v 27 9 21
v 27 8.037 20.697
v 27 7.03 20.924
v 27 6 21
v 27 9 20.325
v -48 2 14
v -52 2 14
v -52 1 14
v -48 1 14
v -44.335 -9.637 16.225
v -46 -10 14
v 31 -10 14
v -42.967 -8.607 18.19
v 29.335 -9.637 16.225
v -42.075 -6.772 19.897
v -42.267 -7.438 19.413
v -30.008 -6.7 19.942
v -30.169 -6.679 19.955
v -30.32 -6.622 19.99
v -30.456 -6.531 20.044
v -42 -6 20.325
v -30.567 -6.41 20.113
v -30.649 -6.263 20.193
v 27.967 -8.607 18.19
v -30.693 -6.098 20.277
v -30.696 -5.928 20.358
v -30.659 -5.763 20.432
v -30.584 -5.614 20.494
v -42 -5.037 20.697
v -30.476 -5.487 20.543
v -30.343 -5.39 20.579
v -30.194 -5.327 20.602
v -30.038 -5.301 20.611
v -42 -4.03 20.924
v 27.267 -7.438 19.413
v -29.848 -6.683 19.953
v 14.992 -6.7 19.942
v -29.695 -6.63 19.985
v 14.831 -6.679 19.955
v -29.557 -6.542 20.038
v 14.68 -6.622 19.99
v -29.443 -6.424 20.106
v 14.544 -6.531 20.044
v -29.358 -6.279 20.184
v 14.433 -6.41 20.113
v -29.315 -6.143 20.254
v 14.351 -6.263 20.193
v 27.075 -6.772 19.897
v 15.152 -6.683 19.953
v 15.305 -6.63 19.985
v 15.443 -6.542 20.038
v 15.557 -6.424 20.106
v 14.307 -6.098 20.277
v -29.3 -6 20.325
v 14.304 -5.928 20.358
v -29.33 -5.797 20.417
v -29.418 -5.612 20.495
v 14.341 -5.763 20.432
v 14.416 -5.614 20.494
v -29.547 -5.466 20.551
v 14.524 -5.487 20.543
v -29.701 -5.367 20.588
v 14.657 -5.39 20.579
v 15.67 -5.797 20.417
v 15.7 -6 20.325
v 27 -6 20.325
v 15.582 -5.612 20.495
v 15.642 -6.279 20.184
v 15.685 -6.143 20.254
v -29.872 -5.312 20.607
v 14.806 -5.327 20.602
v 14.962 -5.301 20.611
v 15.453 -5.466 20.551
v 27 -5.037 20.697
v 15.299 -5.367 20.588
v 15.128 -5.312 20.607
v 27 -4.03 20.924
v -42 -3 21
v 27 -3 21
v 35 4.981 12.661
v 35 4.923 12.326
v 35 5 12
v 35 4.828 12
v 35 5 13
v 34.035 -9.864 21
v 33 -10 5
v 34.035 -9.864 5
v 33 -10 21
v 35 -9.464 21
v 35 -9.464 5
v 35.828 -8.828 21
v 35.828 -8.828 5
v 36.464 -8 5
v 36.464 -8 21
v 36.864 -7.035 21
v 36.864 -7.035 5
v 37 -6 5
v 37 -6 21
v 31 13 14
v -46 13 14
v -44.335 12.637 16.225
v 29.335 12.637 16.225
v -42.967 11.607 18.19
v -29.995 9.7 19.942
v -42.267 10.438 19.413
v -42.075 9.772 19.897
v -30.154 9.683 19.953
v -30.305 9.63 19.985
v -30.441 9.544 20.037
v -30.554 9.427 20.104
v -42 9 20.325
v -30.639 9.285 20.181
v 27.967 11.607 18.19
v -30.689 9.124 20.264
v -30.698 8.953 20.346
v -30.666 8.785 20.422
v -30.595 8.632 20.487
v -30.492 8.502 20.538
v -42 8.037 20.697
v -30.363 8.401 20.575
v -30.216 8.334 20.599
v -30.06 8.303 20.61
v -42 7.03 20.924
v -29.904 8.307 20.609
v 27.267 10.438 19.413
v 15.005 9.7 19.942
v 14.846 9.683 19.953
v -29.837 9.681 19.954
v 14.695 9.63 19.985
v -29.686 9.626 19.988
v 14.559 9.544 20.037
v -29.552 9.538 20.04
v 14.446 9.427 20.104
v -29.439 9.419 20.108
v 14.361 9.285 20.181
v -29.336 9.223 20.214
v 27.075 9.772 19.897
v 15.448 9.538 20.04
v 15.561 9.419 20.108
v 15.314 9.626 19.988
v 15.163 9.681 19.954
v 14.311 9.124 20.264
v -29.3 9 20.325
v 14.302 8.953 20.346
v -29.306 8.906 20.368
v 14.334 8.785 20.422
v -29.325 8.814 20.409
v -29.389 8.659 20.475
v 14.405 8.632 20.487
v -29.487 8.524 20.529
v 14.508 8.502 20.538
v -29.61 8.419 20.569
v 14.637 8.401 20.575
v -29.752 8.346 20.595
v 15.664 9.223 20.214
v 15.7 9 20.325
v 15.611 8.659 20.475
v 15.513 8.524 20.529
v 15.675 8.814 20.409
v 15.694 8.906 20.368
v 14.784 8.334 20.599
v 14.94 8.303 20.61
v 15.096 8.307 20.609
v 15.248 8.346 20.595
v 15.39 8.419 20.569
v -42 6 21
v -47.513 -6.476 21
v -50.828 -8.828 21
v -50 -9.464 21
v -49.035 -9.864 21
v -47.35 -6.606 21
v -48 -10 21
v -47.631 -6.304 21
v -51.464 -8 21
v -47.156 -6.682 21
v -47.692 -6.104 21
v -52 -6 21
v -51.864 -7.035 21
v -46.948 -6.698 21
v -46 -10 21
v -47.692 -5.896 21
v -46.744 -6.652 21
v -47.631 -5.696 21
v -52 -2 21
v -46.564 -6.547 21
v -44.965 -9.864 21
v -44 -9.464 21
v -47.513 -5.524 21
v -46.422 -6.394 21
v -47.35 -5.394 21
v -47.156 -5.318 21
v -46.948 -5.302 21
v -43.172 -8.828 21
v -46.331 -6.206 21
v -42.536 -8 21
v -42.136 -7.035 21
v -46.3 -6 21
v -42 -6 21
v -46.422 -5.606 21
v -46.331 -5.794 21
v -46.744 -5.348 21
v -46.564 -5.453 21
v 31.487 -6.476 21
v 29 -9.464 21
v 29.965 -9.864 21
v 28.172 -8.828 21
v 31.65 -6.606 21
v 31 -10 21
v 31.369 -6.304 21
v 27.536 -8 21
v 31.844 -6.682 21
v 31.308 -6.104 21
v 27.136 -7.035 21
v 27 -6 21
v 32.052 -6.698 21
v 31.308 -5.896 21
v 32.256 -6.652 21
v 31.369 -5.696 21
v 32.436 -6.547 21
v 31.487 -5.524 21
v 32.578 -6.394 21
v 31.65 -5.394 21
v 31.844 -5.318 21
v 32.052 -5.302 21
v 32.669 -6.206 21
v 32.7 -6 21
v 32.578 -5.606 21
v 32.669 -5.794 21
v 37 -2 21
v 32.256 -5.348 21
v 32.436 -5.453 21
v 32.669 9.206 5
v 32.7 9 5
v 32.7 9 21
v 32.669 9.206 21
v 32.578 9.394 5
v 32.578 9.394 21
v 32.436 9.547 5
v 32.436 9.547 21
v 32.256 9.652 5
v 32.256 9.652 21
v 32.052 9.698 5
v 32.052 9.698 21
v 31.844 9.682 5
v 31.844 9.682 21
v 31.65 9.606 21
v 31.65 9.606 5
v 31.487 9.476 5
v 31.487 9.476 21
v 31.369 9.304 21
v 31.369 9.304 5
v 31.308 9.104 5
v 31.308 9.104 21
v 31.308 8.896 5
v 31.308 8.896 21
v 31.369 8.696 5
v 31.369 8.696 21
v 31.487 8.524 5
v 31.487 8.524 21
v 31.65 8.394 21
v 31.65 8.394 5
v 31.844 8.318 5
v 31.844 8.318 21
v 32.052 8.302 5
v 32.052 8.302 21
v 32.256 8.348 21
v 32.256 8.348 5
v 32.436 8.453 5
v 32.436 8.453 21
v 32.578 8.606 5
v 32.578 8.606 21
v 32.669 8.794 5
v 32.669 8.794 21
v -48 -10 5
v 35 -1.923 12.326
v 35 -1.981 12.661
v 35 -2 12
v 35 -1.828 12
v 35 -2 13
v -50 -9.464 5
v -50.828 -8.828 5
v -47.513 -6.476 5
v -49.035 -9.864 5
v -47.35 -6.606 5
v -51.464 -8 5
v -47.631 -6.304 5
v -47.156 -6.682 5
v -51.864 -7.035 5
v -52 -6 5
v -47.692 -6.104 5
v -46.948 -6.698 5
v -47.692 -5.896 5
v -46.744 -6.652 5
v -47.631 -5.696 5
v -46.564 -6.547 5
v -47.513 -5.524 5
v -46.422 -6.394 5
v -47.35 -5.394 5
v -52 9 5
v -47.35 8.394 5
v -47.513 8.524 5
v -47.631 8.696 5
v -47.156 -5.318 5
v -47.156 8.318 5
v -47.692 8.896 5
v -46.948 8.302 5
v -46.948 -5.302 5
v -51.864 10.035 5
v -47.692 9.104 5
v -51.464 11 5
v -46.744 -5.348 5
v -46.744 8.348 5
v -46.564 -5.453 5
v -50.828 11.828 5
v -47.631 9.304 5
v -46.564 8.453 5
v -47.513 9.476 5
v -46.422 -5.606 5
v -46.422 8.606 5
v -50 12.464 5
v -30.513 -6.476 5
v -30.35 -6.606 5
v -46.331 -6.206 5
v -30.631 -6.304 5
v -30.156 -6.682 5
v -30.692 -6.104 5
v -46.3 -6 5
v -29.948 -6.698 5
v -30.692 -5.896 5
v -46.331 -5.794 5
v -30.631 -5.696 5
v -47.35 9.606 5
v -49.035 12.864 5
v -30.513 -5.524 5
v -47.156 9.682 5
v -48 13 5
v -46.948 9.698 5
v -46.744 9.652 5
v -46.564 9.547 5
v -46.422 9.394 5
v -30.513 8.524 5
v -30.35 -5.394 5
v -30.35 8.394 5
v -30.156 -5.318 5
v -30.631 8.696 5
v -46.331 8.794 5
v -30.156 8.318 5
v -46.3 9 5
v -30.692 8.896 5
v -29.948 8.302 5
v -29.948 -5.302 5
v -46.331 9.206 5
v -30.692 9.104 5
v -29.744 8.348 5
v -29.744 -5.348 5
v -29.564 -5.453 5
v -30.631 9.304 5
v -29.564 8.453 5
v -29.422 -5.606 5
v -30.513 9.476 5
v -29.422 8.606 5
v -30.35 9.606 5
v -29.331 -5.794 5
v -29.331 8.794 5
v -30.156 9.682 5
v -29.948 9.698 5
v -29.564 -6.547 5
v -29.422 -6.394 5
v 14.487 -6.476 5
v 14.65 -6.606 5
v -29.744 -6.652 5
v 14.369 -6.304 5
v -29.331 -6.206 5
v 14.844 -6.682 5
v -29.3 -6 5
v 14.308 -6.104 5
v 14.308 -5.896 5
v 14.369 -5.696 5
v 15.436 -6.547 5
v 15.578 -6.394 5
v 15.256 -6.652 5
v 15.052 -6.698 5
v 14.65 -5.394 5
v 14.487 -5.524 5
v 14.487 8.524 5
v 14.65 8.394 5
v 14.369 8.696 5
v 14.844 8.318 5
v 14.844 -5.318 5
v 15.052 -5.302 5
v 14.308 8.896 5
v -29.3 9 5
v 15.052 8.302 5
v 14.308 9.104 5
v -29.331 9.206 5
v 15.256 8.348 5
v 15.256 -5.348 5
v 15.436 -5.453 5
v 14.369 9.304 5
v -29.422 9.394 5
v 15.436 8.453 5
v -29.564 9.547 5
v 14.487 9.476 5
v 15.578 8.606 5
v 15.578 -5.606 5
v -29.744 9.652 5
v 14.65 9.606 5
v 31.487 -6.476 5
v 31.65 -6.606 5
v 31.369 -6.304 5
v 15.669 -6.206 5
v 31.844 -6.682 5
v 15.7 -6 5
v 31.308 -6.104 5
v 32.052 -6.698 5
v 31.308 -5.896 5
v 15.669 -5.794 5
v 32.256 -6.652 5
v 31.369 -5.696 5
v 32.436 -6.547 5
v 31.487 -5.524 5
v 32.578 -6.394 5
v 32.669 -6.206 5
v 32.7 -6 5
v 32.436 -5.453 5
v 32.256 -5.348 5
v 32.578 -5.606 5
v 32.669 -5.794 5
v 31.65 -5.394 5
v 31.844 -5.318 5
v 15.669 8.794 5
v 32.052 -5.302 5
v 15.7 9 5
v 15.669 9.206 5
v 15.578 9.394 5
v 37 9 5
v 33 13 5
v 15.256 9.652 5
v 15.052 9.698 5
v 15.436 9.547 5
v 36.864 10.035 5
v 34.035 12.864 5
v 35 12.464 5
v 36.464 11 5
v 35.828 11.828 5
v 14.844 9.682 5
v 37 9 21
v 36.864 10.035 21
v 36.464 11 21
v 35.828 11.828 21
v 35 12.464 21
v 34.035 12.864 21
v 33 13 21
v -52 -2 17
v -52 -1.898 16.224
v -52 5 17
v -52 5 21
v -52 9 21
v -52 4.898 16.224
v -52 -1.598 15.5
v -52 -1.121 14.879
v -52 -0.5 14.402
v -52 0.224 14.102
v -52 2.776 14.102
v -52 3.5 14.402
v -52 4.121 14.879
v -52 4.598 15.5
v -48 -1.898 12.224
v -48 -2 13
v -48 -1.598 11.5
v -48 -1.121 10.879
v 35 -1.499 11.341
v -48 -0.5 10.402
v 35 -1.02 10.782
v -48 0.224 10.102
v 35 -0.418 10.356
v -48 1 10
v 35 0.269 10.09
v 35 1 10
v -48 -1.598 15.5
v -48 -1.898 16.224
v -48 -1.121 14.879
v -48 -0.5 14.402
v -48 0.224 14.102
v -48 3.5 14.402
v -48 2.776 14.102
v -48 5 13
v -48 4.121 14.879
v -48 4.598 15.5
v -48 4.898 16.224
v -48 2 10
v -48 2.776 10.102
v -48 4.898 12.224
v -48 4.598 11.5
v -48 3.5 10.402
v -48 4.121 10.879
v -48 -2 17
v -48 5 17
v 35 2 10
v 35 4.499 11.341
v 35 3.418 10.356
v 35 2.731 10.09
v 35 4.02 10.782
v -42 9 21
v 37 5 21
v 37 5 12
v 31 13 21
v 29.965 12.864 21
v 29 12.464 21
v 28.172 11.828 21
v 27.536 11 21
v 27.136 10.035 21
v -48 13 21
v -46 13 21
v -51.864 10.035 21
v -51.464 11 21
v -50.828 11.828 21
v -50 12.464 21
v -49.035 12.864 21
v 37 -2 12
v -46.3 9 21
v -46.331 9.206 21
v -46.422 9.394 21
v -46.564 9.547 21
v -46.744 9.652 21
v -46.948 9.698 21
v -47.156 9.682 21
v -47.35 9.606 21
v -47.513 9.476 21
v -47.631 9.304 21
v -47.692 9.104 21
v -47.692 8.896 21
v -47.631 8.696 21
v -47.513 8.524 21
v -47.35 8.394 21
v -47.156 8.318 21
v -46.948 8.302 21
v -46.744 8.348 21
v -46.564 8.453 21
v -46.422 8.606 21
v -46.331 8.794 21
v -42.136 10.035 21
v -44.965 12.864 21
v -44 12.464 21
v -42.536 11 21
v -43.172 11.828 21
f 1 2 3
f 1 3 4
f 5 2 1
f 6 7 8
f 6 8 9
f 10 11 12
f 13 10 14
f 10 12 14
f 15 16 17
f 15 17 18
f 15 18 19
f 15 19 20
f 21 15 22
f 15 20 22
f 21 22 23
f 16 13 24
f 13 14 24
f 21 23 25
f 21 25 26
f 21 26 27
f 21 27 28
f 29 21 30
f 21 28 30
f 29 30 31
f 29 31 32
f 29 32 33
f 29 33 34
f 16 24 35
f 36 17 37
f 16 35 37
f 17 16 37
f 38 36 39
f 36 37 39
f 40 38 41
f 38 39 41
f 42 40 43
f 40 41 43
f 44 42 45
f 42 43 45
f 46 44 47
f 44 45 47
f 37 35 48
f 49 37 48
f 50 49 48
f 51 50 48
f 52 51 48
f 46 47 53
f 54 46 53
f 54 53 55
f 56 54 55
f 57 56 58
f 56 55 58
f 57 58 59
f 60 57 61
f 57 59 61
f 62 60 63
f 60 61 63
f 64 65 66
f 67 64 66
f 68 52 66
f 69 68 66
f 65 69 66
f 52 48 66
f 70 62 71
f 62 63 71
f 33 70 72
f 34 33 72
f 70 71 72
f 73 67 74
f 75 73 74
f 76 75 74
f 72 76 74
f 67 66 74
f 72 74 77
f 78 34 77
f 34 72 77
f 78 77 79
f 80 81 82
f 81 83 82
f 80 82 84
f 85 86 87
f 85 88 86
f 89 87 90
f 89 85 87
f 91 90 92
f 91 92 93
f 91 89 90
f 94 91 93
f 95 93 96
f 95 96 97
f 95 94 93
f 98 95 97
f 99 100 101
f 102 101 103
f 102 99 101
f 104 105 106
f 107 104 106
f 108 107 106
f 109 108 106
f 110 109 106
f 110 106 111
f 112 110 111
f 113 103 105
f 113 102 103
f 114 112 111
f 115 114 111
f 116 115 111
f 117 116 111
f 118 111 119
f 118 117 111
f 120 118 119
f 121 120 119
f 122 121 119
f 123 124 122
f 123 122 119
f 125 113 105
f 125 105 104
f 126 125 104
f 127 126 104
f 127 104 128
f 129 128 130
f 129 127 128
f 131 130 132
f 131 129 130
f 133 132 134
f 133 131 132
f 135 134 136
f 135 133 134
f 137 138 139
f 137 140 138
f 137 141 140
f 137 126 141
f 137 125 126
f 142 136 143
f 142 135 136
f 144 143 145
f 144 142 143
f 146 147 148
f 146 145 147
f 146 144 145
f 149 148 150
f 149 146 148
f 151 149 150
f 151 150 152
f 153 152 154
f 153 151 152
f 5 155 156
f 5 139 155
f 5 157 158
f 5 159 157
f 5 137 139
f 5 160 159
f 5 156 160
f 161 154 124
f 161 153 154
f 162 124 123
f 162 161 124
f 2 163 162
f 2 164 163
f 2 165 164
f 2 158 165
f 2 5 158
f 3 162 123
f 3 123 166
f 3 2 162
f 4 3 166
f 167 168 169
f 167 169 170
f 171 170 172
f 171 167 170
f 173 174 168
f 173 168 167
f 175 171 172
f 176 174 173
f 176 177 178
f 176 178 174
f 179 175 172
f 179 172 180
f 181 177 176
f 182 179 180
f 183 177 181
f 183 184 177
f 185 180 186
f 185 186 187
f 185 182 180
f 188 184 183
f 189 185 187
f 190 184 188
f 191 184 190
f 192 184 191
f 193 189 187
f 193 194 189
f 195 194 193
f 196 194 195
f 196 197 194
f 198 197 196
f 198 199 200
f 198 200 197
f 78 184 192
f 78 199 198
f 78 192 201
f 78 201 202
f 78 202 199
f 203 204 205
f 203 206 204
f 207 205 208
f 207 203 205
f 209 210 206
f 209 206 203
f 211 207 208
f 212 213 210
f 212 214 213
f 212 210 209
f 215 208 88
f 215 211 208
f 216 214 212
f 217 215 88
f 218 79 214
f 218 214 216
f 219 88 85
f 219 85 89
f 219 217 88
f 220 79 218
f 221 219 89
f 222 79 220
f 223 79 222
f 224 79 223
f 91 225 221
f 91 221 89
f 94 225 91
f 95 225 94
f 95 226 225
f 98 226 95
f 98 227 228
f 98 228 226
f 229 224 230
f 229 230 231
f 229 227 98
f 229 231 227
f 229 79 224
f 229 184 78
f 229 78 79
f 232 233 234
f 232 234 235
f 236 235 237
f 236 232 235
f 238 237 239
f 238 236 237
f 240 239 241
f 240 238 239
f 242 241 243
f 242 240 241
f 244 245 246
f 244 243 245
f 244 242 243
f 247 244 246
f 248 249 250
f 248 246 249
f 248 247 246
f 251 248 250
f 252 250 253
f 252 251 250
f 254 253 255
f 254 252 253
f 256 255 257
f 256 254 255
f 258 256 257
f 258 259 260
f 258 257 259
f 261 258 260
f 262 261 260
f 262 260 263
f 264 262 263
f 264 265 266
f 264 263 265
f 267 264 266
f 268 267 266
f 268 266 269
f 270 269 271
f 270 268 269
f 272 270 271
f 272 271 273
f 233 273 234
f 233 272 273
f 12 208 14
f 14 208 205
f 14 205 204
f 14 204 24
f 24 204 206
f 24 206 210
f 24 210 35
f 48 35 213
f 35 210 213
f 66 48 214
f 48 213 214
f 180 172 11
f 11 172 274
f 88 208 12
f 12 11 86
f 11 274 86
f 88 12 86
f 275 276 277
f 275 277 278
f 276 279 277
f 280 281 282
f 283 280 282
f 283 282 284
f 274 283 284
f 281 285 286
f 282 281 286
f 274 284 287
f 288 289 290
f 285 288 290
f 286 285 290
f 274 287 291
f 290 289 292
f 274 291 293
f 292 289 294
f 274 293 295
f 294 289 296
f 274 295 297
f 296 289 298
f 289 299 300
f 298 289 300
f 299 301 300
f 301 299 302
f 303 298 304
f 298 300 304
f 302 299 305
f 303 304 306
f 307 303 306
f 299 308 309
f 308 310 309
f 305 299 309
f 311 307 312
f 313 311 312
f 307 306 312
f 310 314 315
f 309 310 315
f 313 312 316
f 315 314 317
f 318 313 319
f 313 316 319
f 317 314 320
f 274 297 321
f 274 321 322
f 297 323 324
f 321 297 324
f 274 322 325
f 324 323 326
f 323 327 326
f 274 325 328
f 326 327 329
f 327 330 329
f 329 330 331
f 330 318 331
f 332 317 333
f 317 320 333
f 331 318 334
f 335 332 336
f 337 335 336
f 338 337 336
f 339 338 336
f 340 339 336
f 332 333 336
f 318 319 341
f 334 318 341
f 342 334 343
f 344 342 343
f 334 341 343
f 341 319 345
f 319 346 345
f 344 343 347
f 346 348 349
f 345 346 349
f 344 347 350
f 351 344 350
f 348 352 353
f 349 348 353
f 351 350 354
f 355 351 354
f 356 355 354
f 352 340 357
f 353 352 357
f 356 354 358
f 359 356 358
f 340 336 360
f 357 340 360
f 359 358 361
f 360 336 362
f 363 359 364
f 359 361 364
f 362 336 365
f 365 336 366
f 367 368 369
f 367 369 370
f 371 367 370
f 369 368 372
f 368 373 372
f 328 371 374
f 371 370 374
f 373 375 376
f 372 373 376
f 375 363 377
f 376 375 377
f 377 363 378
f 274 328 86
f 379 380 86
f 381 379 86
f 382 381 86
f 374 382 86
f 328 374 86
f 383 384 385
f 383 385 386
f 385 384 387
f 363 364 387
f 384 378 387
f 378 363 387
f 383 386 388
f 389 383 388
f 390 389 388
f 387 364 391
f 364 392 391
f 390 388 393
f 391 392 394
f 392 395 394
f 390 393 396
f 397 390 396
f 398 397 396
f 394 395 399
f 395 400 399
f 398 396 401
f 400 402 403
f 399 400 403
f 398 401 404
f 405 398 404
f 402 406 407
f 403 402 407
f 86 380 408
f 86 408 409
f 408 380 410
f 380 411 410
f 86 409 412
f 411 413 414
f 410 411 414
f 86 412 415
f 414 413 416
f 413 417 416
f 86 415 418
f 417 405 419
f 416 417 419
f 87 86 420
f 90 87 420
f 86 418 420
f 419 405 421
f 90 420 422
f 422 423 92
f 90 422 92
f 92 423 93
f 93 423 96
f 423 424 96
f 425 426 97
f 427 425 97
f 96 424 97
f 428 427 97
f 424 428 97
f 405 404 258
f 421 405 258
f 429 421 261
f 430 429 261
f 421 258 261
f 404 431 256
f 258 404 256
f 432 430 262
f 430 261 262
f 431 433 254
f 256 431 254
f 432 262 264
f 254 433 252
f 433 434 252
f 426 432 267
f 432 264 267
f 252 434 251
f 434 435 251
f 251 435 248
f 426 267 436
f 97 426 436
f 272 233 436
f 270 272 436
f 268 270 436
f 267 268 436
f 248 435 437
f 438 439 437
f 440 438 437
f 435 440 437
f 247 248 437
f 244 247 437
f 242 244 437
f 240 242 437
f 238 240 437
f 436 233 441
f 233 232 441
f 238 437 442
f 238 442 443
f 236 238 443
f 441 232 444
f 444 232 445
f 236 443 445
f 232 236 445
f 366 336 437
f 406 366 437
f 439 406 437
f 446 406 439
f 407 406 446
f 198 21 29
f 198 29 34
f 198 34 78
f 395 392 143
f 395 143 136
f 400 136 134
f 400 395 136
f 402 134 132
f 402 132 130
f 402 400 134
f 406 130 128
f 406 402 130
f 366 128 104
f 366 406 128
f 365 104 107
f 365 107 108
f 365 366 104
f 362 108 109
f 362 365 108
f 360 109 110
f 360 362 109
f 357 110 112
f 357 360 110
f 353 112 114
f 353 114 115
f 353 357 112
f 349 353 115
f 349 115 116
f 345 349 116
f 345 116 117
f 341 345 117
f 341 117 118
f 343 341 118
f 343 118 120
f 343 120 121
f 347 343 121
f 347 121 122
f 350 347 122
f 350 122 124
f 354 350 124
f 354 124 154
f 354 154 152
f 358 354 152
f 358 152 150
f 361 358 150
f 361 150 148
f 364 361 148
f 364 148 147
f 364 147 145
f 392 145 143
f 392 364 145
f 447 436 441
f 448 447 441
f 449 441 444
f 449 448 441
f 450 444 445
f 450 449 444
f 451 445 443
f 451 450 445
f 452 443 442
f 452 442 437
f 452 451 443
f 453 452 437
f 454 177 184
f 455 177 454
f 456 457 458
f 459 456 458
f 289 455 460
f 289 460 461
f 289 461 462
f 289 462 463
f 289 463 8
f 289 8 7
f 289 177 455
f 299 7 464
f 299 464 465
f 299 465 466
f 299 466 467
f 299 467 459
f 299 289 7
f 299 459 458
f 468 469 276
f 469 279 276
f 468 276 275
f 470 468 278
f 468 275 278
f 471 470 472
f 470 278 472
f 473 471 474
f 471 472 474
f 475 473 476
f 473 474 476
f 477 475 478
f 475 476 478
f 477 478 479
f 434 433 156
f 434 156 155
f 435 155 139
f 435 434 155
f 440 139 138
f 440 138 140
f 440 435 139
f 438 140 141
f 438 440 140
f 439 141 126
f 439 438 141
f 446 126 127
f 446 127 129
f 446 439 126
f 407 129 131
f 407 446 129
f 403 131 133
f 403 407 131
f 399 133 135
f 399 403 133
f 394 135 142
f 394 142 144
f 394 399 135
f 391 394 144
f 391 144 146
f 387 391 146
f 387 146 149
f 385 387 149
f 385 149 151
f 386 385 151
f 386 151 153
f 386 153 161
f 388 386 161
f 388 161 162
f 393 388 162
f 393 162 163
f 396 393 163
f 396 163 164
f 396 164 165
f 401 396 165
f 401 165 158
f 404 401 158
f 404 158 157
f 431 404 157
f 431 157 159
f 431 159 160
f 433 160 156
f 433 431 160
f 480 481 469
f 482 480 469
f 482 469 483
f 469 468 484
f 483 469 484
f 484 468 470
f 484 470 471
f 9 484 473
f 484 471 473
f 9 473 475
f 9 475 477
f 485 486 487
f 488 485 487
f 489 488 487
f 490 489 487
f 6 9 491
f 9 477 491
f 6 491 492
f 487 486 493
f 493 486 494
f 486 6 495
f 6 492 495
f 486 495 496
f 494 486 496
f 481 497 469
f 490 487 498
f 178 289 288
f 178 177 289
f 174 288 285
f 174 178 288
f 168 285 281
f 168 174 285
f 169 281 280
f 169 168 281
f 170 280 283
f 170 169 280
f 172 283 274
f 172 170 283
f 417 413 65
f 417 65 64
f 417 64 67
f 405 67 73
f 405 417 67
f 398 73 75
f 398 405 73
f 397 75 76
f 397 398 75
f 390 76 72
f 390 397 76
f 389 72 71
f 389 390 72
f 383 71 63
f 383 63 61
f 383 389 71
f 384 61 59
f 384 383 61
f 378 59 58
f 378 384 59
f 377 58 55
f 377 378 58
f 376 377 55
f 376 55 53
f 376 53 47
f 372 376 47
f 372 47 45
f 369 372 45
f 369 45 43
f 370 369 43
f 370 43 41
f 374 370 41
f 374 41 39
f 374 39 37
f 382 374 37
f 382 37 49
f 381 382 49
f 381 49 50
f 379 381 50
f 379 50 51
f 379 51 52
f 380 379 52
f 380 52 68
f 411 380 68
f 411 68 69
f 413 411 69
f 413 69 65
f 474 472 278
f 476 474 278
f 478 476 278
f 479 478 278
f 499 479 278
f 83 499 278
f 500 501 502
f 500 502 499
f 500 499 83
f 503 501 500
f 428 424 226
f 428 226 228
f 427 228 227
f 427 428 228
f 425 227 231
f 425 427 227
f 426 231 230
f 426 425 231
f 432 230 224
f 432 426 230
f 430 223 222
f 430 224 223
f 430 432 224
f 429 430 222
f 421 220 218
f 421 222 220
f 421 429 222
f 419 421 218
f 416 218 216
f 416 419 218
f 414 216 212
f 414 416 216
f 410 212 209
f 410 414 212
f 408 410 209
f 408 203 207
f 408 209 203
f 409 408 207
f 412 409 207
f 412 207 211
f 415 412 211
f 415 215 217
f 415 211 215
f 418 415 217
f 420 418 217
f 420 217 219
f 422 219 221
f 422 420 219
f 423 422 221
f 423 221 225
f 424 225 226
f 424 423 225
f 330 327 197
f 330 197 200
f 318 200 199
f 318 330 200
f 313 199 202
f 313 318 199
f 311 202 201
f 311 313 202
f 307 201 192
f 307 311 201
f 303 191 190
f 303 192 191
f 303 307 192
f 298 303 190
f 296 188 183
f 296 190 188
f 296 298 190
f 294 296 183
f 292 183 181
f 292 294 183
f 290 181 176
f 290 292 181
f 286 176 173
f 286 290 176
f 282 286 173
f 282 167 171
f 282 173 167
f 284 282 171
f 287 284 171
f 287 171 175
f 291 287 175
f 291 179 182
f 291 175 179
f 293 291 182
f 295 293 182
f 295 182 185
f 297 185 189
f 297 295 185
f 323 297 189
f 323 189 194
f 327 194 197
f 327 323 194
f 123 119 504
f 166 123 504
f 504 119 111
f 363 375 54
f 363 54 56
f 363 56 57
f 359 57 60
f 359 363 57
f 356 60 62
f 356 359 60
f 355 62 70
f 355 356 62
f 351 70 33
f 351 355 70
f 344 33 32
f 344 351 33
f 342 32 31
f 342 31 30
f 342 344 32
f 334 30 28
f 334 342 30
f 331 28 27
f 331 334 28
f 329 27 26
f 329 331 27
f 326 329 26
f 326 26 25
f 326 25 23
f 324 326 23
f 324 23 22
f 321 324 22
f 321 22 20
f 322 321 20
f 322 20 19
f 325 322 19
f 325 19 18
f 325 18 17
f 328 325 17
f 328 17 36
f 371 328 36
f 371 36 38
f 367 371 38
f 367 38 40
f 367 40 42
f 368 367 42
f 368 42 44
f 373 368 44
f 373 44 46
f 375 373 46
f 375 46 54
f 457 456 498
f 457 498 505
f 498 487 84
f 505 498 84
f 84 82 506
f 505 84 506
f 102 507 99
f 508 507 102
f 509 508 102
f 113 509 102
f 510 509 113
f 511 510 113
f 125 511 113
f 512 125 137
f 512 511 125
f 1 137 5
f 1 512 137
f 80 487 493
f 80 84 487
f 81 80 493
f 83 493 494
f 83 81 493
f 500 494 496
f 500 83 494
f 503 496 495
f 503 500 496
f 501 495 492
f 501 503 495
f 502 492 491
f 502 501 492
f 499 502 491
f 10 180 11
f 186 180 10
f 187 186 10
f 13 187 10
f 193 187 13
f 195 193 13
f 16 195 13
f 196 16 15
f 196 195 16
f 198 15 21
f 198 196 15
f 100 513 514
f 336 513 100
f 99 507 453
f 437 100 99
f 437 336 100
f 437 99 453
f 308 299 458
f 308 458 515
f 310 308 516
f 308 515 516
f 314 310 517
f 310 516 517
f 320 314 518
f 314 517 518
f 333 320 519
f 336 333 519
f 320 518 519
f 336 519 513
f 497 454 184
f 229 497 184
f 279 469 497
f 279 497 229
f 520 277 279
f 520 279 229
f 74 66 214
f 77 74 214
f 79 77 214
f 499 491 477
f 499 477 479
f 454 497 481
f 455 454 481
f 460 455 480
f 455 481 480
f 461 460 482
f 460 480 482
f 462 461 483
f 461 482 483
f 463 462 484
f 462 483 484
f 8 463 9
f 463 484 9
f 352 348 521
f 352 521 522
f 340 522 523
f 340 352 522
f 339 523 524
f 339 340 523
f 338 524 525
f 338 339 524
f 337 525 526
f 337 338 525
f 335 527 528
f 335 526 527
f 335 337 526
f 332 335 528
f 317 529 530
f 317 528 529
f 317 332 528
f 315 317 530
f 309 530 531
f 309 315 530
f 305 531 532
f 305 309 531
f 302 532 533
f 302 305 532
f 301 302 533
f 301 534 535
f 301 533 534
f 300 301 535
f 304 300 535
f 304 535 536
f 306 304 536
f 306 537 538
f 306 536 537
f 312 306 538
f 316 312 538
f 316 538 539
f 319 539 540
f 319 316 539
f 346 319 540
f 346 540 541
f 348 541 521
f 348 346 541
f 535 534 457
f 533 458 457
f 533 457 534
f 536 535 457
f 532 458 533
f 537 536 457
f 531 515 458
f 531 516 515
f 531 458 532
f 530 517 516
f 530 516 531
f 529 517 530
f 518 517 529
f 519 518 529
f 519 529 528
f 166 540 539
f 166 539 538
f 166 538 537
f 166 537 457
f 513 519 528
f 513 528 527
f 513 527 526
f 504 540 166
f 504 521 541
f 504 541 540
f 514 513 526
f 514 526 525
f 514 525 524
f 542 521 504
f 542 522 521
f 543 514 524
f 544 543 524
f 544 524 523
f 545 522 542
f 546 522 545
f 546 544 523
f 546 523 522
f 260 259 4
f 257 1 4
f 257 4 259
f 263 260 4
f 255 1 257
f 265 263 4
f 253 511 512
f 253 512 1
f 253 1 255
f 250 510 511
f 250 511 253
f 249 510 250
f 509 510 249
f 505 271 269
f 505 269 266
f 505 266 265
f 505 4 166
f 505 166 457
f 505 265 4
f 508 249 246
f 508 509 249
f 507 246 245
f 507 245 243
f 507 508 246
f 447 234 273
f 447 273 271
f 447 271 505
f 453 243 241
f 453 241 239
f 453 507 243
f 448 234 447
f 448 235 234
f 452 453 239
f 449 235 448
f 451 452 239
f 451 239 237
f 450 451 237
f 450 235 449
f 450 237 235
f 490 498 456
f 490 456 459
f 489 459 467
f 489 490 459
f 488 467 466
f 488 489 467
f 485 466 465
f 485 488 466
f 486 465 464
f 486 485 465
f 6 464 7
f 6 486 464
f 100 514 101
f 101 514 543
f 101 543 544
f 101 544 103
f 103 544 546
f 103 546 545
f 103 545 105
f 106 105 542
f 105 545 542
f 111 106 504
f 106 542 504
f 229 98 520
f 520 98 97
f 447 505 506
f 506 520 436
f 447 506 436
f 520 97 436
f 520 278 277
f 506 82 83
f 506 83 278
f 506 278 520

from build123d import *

# Parameters (mm, degrees)
BOX_W             = 69
BOX_H             = 23
BOX_DEPTH         = 21
FILLET002039_R    = 7
BOX048_W          = 69
BOX048_H          = 23
BOX048_DEPTH      = 21
CYLINDER_R        = 0.7
CYLINDER_DEPTH    = 25
CYLINDER042_R     = 0.7
CYLINDER042_DEPTH = 25
CYLINDER043_R     = 0.7
CYLINDER043_DEPTH = 25
CYLINDER044_R     = 0.7
CYLINDER044_DEPTH = 25
CYLINDER045_R     = 0.7
CYLINDER045_DEPTH = 25
CYLINDER046_R     = 0.7
CYLINDER046_DEPTH = 25
CYLINDER047_R     = 0.7
CYLINDER047_DEPTH = 25
CYLINDER048_R     = 0.7
CYLINDER048_DEPTH = 25
BOX044_W          = 83
BOX044_H          = 7
BOX044_DEPTH      = 10
FILLET002036_R    = 3
BOX029_W          = 83
BOX029_H          = 7
BOX029_DEPTH      = 18
FILLET002035_R    = 3
BOX045_W          = 10
BOX045_H          = 7
BOX045_DEPTH      = 14
BOX046_W          = 89
BOX046_H          = 23
BOX046_DEPTH      = 16
FILLET_R          = 4
FILLET002040_R    = 4


with BuildPart() as fillet002039:
    # Box → Box (new body)
    with BuildSketch(Plane(origin=(-42, -10, 0), x_dir=(1, 0, 0), z_dir=(0, 0, 1))):
        with Locations((34.5, 11.5)):
            Rectangle(BOX_W, BOX_H)
    extrude(amount=BOX_DEPTH)

    # Fillet002039
    fillet002039_edges = [fillet002039.edges().sort_by_distance(p)[0] for p in [
        (-7.5, -10, 21),
        (-7.5, 13, 21),
    ]]
    fillet(fillet002039_edges, radius=FILLET002039_R)


with BuildPart() as cut011004:
    # Box048 → Box048 (new body)
    with BuildSketch(Plane(origin=(-42, -10, 14), x_dir=(1, 0, 0), z_dir=(0, 0, 1))):
        with Locations((34.5, 11.5)):
            Rectangle(BOX048_W, BOX048_H)
    extrude(amount=BOX048_DEPTH)

    # Cut011004: cut Fillet002039
    add(fillet002039.part, mode=Mode.SUBTRACT)


with BuildPart() as hubscrewholle001:
    # Cylinder → Cylinder (new body)
    with BuildSketch(Plane(origin=(-30, -6, 0), x_dir=(1, 0, 0), z_dir=(0, 0, 1))):
        Circle(CYLINDER_R)
    extrude(amount=CYLINDER_DEPTH)


with BuildPart() as hubscrewholle002:
    # Cylinder042 → Cylinder042 (new body)
    with BuildSketch(Plane(origin=(-30, 9, 0), x_dir=(1, 0, 0), z_dir=(0, 0, 1))):
        Circle(CYLINDER042_R)
    extrude(amount=CYLINDER042_DEPTH)


with BuildPart() as hubscrewholle003:
    # Cylinder043 → Cylinder043 (new body)
    with BuildSketch(Plane(origin=(15, -6, 0), x_dir=(1, 0, 0), z_dir=(0, 0, 1))):
        Circle(CYLINDER043_R)
    extrude(amount=CYLINDER043_DEPTH)


with BuildPart() as hubscrewholle004:
    # Cylinder044 → Cylinder044 (new body)
    with BuildSketch(Plane(origin=(15, 9, 0), x_dir=(1, 0, 0), z_dir=(0, 0, 1))):
        Circle(CYLINDER044_R)
    extrude(amount=CYLINDER044_DEPTH)


with BuildPart() as hubscrewholle005:
    # Cylinder045 → Cylinder045 (new body)
    with BuildSketch(Plane(origin=(-47, -6, 0), x_dir=(1, 0, 0), z_dir=(0, 0, 1))):
        Circle(CYLINDER045_R)
    extrude(amount=CYLINDER045_DEPTH)


with BuildPart() as hubscrewholle006:
    # Cylinder046 → Cylinder046 (new body)
    with BuildSketch(Plane(origin=(-47, 9, 0), x_dir=(1, 0, 0), z_dir=(0, 0, 1))):
        Circle(CYLINDER046_R)
    extrude(amount=CYLINDER046_DEPTH)


with BuildPart() as hubscrewholle007:
    # Cylinder047 → Cylinder047 (new body)
    with BuildSketch(Plane(origin=(32, 9, 0), x_dir=(1, 0, 0), z_dir=(0, 0, 1))):
        Circle(CYLINDER047_R)
    extrude(amount=CYLINDER047_DEPTH)


with BuildPart() as fusion033:
    # Cylinder048 → Cylinder048 (new body)
    with BuildSketch(Plane(origin=(32, -6, 0), x_dir=(1, 0, 0), z_dir=(0, 0, 1))):
        Circle(CYLINDER048_R)
    extrude(amount=CYLINDER048_DEPTH)

    # Fusion033: union HubScrewHolle001, HubScrewHolle002, HubScrewHolle003, HubScrewHolle004, HubScrewHolle005, HubScrewHolle006, HubScrewHolle007
    add(hubscrewholle001.part)
    add(hubscrewholle002.part)
    add(hubscrewholle003.part)
    add(hubscrewholle004.part)
    add(hubscrewholle005.part)
    add(hubscrewholle006.part)
    add(hubscrewholle007.part)


with BuildPart() as fillet002036:
    # Box044 → Box044 (new body)
    with BuildSketch(Plane(origin=(-50, 0, 4), x_dir=(1, 0, 0), z_dir=(0, 0, 1))):
        with Locations((41.5, 3.5)):
            Rectangle(BOX044_W, BOX044_H)
    extrude(amount=BOX044_DEPTH)

    # Fillet002036
    fillet002036_edges = [fillet002036.edges().sort_by_distance(p)[0] for p in [
        (-8.5, 0, 4),
        (-8.5, 0, 14),
        (-8.5, 7, 4),
        (-8.5, 7, 14),
    ]]
    fillet(fillet002036_edges, radius=FILLET002036_R)


with BuildPart() as fillet002035:
    # Box029 → Box029 (new body)
    with BuildSketch(Plane.XY):
        with Locations((41.5, 3.5)):
            Rectangle(BOX029_W, BOX029_H)
    extrude(amount=BOX029_DEPTH)

    # Fillet002035
    fillet002035_edges = [fillet002035.edges().sort_by_distance(p)[0] for p in [
        (41.5, 0, 0),
        (41.5, 0, 18),
        (41.5, 7, 0),
        (41.5, 7, 18),
    ]]
    fillet(fillet002035_edges, radius=FILLET002035_R)


with BuildPart() as fusion034:
    # Box045 → Box045 (new body)
    with BuildSketch(Plane(origin=(83, 0, 2), x_dir=(1, 0, 0), z_dir=(0, 0, 1))):
        with Locations((5, 3.5)):
            Rectangle(BOX045_W, BOX045_H)
    extrude(amount=BOX045_DEPTH)

    # Fusion032: union Fillet002036, Fillet002035
    add(fillet002036.part)
    add(fillet002035.part)


with BuildPart() as fusion034_1:
    # Fusion032 placement: moved
    add(fusion034.part.moved(Location((-48, -2, 10))))

    # Fusion034: union Fusion033
    add(fusion033.part)


with BuildPart() as hubholder:
    # Box046 → Box046 (new body)
    with BuildSketch(Plane(origin=(-52, -10, 5), x_dir=(1, 0, 0), z_dir=(0, 0, 1))):
        with Locations((44.5, 11.5)):
            Rectangle(BOX046_W, BOX046_H)
    extrude(amount=BOX046_DEPTH)

    # Fillet
    fillet_edges = [hubholder.edges().sort_by_distance(p)[0] for p in [
        (-52, -10, 13),
        (-52, 13, 13),
        (37, -10, 13),
        (37, 13, 13),
    ]]
    fillet(fillet_edges, radius=FILLET_R)

    # Cut009: cut Fusion034
    add(fusion034_1.part, mode=Mode.SUBTRACT)

    # Cut011005: cut Cut011004
    add(cut011004.part, mode=Mode.SUBTRACT)

    # Fillet002040
    fillet002040_edges = [hubholder.edges().sort_by_distance(p)[0] for p in [
        (-42, -10, 17.5),
        (27, -10, 17.5),
        (27, 13, 17.5),
        (-42, 13, 17.5),
    ]]
    fillet(fillet002040_edges, radius=FILLET002040_R)


solid = hubholder.part
